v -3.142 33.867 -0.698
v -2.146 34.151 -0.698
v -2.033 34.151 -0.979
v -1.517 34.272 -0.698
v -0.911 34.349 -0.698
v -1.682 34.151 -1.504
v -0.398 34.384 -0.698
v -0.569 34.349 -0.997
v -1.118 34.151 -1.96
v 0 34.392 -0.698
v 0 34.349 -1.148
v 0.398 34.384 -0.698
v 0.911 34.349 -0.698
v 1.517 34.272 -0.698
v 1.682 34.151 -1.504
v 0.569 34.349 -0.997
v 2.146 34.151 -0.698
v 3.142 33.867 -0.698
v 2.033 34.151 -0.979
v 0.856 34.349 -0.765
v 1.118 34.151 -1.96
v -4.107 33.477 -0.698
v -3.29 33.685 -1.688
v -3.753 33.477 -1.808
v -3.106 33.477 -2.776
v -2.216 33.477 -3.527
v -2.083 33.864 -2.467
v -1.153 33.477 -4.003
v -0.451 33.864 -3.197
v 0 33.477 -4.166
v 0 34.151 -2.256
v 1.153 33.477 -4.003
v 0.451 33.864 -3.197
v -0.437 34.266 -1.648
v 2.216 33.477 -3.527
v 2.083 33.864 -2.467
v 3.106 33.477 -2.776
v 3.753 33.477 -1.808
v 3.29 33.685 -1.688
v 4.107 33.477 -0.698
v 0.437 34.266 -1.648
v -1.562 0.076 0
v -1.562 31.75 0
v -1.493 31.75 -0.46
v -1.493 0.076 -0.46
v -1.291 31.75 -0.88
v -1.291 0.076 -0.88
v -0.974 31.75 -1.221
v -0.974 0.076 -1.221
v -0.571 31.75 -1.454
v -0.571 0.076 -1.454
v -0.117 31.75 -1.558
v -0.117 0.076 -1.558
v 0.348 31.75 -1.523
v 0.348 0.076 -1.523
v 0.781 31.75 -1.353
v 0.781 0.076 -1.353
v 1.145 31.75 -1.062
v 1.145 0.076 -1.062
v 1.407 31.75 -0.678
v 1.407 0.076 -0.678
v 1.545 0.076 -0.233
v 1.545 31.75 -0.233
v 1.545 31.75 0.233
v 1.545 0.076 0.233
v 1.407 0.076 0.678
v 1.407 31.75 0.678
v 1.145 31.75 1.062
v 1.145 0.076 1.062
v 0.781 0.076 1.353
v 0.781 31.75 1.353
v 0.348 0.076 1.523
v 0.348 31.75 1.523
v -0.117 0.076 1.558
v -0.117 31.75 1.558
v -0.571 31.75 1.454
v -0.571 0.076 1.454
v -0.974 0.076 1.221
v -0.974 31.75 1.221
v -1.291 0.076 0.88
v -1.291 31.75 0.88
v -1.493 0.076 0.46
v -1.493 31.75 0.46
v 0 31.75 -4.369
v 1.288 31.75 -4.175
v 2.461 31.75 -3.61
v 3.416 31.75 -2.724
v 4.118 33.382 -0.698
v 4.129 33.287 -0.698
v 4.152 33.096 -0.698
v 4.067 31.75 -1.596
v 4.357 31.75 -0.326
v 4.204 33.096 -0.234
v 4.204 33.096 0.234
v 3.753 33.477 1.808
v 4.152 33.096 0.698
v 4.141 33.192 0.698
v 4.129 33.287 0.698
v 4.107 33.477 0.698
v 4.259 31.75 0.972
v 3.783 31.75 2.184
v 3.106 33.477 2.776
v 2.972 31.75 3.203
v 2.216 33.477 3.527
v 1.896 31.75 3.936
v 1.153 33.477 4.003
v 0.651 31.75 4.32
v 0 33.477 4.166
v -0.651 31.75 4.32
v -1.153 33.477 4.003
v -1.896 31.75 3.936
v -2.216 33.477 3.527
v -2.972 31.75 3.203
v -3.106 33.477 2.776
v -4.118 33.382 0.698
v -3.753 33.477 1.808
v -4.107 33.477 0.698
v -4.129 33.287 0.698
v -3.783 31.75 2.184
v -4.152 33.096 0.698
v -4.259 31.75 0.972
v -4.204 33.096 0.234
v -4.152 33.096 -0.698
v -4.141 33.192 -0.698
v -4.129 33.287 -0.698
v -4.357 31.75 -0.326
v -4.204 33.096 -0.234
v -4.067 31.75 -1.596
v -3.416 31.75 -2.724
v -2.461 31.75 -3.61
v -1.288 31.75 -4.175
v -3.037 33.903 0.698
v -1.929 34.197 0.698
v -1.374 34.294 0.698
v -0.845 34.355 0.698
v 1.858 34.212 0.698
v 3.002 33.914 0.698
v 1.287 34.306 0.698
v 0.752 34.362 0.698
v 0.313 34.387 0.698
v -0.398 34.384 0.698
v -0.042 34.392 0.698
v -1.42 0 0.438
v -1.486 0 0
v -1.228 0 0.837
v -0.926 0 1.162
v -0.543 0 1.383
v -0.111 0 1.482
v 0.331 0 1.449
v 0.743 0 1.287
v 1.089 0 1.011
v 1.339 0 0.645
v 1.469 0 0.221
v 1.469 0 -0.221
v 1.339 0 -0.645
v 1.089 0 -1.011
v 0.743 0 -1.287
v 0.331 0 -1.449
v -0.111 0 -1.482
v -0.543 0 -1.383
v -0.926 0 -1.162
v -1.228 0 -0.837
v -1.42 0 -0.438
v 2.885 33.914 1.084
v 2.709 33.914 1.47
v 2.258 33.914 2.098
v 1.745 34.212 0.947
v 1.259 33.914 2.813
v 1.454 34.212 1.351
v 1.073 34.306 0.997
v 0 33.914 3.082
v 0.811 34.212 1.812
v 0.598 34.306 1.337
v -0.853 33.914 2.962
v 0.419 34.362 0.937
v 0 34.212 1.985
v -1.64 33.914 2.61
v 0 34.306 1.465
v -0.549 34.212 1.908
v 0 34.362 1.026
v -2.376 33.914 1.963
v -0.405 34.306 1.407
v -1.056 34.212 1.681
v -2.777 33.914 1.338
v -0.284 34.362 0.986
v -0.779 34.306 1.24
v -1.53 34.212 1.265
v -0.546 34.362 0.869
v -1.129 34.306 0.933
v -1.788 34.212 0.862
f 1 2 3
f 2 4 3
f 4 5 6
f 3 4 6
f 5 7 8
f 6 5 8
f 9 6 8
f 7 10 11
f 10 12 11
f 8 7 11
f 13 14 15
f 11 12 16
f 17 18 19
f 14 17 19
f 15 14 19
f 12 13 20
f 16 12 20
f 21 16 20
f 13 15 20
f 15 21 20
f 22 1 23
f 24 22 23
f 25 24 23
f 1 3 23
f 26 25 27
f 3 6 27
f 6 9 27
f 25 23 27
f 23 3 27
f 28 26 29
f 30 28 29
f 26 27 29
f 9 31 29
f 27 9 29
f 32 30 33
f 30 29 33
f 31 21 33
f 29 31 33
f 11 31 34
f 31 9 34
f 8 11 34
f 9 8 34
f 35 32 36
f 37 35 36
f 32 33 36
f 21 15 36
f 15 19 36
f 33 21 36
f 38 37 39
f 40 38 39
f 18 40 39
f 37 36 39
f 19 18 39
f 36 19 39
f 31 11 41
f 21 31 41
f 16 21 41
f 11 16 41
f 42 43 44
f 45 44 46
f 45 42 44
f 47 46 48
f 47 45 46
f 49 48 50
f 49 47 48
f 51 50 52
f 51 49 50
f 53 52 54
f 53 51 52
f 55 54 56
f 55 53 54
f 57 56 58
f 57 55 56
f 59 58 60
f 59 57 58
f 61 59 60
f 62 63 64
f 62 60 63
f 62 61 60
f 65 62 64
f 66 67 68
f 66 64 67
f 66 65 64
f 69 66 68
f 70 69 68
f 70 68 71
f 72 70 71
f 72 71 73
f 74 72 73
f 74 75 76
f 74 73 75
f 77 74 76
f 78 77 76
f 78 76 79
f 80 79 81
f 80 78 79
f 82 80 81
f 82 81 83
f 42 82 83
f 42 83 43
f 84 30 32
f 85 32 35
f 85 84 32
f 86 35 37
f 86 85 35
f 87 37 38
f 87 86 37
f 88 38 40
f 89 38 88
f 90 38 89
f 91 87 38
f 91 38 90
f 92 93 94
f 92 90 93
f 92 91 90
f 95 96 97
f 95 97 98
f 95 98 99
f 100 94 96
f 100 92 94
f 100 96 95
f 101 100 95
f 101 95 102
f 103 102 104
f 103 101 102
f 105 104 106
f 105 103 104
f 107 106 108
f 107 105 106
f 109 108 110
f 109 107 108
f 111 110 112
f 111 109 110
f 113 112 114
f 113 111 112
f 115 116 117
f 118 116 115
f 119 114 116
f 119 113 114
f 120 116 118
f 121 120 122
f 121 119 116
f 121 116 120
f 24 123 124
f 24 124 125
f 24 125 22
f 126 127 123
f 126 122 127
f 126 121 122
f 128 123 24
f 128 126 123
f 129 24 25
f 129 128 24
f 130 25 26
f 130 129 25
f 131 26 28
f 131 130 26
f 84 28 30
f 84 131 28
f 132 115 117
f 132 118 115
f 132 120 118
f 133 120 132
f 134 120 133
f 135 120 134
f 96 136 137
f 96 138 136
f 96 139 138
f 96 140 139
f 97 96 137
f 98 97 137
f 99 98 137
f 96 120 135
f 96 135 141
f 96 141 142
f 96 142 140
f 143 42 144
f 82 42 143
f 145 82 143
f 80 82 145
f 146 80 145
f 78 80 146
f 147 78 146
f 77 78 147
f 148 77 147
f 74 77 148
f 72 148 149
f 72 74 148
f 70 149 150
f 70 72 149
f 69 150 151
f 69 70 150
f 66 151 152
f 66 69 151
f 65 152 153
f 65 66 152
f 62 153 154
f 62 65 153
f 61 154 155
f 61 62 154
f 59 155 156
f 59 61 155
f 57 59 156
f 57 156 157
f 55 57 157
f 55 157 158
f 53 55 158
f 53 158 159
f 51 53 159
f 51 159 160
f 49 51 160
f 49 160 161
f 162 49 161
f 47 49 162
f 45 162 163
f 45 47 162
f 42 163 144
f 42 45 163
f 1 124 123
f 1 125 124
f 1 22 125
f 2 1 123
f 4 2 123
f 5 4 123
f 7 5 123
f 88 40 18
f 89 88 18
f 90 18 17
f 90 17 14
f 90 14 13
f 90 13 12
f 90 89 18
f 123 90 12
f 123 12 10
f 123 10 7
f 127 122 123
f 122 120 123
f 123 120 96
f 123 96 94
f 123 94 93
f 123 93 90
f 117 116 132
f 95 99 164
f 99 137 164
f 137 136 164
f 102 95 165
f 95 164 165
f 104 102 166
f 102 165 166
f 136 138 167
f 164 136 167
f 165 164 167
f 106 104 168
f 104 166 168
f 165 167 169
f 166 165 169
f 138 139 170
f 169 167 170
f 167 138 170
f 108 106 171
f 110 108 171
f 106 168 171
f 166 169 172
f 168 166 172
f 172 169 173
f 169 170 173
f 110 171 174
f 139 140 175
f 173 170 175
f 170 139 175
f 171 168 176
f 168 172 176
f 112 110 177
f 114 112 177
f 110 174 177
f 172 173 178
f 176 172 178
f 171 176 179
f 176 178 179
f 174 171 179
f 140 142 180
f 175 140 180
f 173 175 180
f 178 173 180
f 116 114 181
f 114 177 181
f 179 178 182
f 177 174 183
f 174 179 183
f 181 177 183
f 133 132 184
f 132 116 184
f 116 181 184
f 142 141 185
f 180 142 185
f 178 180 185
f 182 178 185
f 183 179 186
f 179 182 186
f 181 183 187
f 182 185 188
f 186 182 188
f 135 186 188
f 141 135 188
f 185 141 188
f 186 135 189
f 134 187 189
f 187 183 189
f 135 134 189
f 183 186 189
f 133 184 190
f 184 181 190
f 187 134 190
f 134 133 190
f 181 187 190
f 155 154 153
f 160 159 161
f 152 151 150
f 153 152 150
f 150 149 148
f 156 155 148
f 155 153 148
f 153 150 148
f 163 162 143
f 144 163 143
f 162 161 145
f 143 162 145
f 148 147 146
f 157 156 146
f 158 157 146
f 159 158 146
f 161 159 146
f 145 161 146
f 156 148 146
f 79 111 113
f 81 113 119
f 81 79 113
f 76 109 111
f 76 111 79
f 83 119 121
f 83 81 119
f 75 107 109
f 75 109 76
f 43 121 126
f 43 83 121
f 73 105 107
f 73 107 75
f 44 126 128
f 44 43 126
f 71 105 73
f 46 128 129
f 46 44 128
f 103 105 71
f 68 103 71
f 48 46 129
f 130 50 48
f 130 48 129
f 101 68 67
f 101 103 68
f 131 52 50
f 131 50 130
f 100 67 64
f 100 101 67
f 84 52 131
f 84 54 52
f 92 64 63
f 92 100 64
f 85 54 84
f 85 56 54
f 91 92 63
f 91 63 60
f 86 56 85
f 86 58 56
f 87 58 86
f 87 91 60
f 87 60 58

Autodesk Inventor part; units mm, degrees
ref_plane "YZ Plane" through (0, 0, 0) normal (1, 0, 0) x (0, 1, 0)
ref_plane "XZ Plane" through (0, 0, 0) normal (0, 1, 0) x (-1, 0, 0)
ref_plane "XY Plane" through (0, 0, 0) normal (0, 0, 1) x (1, 0, 0)
sketch "Sketch1" plane through (0, 0, 0) normal (0, 1, 0) x (-1, 0, 0)
  circle A0 centre (0, 0) radius 1.5621
  dimension "d4" = 3.1242
extrude "Body" add sketch "Sketch1" along normal blind 31.75
sketch "Sketch2" plane through (0, 0, 0) normal (1, 0, 0) x (0, 1, 0)
  line L0 (31.75, -1.5621) -> (31.75, 1.5621) projected
  line L1 (31.75, 0) -> (31.75, -4.3688)
  line L2 (33.4772, 0) -> (31.75, 0)
  line L3 (33.4772, 0) -> (33.4772, -4.1656)
  arc A0 (33.4772, -4.1656) -> (34.4169, 0) centre (24.7141, 0) ccw
  line L4 (31.75, -4.3688) -> (33.4772, -4.1656)
  line L5 (33.4772, 0) -> (34.4169, 0)
  point P0 (0, 0)
  dimension "d5" = 4.3688
  dimension "d13" = 1.7272
  dimension "d57" = 4.1656
  dimension "d58" = 9.7028
  dimension "d59" = 0
revolve "Head" add sketch "Sketch2" angle 360 about axis through (0, 33.4772, 0) along (0, -1, 0)
sketch "Sketch6" plane through (0, 0, 0) normal (0, 0, 1) x (1, 0, 0)
  line L0 (0, 0) -> (-1.4859, 0)
  line L1 (1.5621, 0) -> (-1.5621, 0) projected
  line L2 (-1.4859, 0) -> (-2.4948, 1.0089)
  line L3 (-2.4948, 1.0089) -> (-2.9651, -1.2188)
  line L4 (-2.9651, -1.2188) -> (-1.4859, -1.2188)
  line L5 (-1.5621, 0) -> (-1.5621, 31.75) projected
  line L6 (-1.4859, -1.2188) -> (-1.4859, 0)
  line L7 (0, -3.9171) -> (0, 14.9707) projected
  point P0 (-1.5621, 0.0762)
  dimension "d49" = 1.4859
  dimension "d50" = 135
revolve "Tapered End" cut sketch "Sketch6" angle 360 about axis through (0, -10, 0) along (0, 1, 0)
sketch "Sketch7" plane through (0, 0, 0) normal (1, 0, 0) x (0, 1, 0)
  line L0 (31.75, 4.3688) -> (31.75, -4.3688) projected
  line L1 (33.0962, 0.6985) -> (33.0962, -0.6985)
  line L2 (33.0962, 0.6985) -> (35.1028, 0.6985)
  line L3 (35.1028, 0.6985) -> (35.1028, -0.6985)
  line L4 (35.1028, -0.6985) -> (33.0962, -0.6985)
  point P0 (0, 0)
  dimension "d61" = 1.397
  dimension "d62" = 0.6985
  dimension "d65" = 33.0962
  dimension "d66" = 2.0066
extrude "Flathead" cut sketch "Sketch7" against normal mid plane 12.7
properties part number "Screw 8-32 Nylon 1.250" material "VEX Nylon"
